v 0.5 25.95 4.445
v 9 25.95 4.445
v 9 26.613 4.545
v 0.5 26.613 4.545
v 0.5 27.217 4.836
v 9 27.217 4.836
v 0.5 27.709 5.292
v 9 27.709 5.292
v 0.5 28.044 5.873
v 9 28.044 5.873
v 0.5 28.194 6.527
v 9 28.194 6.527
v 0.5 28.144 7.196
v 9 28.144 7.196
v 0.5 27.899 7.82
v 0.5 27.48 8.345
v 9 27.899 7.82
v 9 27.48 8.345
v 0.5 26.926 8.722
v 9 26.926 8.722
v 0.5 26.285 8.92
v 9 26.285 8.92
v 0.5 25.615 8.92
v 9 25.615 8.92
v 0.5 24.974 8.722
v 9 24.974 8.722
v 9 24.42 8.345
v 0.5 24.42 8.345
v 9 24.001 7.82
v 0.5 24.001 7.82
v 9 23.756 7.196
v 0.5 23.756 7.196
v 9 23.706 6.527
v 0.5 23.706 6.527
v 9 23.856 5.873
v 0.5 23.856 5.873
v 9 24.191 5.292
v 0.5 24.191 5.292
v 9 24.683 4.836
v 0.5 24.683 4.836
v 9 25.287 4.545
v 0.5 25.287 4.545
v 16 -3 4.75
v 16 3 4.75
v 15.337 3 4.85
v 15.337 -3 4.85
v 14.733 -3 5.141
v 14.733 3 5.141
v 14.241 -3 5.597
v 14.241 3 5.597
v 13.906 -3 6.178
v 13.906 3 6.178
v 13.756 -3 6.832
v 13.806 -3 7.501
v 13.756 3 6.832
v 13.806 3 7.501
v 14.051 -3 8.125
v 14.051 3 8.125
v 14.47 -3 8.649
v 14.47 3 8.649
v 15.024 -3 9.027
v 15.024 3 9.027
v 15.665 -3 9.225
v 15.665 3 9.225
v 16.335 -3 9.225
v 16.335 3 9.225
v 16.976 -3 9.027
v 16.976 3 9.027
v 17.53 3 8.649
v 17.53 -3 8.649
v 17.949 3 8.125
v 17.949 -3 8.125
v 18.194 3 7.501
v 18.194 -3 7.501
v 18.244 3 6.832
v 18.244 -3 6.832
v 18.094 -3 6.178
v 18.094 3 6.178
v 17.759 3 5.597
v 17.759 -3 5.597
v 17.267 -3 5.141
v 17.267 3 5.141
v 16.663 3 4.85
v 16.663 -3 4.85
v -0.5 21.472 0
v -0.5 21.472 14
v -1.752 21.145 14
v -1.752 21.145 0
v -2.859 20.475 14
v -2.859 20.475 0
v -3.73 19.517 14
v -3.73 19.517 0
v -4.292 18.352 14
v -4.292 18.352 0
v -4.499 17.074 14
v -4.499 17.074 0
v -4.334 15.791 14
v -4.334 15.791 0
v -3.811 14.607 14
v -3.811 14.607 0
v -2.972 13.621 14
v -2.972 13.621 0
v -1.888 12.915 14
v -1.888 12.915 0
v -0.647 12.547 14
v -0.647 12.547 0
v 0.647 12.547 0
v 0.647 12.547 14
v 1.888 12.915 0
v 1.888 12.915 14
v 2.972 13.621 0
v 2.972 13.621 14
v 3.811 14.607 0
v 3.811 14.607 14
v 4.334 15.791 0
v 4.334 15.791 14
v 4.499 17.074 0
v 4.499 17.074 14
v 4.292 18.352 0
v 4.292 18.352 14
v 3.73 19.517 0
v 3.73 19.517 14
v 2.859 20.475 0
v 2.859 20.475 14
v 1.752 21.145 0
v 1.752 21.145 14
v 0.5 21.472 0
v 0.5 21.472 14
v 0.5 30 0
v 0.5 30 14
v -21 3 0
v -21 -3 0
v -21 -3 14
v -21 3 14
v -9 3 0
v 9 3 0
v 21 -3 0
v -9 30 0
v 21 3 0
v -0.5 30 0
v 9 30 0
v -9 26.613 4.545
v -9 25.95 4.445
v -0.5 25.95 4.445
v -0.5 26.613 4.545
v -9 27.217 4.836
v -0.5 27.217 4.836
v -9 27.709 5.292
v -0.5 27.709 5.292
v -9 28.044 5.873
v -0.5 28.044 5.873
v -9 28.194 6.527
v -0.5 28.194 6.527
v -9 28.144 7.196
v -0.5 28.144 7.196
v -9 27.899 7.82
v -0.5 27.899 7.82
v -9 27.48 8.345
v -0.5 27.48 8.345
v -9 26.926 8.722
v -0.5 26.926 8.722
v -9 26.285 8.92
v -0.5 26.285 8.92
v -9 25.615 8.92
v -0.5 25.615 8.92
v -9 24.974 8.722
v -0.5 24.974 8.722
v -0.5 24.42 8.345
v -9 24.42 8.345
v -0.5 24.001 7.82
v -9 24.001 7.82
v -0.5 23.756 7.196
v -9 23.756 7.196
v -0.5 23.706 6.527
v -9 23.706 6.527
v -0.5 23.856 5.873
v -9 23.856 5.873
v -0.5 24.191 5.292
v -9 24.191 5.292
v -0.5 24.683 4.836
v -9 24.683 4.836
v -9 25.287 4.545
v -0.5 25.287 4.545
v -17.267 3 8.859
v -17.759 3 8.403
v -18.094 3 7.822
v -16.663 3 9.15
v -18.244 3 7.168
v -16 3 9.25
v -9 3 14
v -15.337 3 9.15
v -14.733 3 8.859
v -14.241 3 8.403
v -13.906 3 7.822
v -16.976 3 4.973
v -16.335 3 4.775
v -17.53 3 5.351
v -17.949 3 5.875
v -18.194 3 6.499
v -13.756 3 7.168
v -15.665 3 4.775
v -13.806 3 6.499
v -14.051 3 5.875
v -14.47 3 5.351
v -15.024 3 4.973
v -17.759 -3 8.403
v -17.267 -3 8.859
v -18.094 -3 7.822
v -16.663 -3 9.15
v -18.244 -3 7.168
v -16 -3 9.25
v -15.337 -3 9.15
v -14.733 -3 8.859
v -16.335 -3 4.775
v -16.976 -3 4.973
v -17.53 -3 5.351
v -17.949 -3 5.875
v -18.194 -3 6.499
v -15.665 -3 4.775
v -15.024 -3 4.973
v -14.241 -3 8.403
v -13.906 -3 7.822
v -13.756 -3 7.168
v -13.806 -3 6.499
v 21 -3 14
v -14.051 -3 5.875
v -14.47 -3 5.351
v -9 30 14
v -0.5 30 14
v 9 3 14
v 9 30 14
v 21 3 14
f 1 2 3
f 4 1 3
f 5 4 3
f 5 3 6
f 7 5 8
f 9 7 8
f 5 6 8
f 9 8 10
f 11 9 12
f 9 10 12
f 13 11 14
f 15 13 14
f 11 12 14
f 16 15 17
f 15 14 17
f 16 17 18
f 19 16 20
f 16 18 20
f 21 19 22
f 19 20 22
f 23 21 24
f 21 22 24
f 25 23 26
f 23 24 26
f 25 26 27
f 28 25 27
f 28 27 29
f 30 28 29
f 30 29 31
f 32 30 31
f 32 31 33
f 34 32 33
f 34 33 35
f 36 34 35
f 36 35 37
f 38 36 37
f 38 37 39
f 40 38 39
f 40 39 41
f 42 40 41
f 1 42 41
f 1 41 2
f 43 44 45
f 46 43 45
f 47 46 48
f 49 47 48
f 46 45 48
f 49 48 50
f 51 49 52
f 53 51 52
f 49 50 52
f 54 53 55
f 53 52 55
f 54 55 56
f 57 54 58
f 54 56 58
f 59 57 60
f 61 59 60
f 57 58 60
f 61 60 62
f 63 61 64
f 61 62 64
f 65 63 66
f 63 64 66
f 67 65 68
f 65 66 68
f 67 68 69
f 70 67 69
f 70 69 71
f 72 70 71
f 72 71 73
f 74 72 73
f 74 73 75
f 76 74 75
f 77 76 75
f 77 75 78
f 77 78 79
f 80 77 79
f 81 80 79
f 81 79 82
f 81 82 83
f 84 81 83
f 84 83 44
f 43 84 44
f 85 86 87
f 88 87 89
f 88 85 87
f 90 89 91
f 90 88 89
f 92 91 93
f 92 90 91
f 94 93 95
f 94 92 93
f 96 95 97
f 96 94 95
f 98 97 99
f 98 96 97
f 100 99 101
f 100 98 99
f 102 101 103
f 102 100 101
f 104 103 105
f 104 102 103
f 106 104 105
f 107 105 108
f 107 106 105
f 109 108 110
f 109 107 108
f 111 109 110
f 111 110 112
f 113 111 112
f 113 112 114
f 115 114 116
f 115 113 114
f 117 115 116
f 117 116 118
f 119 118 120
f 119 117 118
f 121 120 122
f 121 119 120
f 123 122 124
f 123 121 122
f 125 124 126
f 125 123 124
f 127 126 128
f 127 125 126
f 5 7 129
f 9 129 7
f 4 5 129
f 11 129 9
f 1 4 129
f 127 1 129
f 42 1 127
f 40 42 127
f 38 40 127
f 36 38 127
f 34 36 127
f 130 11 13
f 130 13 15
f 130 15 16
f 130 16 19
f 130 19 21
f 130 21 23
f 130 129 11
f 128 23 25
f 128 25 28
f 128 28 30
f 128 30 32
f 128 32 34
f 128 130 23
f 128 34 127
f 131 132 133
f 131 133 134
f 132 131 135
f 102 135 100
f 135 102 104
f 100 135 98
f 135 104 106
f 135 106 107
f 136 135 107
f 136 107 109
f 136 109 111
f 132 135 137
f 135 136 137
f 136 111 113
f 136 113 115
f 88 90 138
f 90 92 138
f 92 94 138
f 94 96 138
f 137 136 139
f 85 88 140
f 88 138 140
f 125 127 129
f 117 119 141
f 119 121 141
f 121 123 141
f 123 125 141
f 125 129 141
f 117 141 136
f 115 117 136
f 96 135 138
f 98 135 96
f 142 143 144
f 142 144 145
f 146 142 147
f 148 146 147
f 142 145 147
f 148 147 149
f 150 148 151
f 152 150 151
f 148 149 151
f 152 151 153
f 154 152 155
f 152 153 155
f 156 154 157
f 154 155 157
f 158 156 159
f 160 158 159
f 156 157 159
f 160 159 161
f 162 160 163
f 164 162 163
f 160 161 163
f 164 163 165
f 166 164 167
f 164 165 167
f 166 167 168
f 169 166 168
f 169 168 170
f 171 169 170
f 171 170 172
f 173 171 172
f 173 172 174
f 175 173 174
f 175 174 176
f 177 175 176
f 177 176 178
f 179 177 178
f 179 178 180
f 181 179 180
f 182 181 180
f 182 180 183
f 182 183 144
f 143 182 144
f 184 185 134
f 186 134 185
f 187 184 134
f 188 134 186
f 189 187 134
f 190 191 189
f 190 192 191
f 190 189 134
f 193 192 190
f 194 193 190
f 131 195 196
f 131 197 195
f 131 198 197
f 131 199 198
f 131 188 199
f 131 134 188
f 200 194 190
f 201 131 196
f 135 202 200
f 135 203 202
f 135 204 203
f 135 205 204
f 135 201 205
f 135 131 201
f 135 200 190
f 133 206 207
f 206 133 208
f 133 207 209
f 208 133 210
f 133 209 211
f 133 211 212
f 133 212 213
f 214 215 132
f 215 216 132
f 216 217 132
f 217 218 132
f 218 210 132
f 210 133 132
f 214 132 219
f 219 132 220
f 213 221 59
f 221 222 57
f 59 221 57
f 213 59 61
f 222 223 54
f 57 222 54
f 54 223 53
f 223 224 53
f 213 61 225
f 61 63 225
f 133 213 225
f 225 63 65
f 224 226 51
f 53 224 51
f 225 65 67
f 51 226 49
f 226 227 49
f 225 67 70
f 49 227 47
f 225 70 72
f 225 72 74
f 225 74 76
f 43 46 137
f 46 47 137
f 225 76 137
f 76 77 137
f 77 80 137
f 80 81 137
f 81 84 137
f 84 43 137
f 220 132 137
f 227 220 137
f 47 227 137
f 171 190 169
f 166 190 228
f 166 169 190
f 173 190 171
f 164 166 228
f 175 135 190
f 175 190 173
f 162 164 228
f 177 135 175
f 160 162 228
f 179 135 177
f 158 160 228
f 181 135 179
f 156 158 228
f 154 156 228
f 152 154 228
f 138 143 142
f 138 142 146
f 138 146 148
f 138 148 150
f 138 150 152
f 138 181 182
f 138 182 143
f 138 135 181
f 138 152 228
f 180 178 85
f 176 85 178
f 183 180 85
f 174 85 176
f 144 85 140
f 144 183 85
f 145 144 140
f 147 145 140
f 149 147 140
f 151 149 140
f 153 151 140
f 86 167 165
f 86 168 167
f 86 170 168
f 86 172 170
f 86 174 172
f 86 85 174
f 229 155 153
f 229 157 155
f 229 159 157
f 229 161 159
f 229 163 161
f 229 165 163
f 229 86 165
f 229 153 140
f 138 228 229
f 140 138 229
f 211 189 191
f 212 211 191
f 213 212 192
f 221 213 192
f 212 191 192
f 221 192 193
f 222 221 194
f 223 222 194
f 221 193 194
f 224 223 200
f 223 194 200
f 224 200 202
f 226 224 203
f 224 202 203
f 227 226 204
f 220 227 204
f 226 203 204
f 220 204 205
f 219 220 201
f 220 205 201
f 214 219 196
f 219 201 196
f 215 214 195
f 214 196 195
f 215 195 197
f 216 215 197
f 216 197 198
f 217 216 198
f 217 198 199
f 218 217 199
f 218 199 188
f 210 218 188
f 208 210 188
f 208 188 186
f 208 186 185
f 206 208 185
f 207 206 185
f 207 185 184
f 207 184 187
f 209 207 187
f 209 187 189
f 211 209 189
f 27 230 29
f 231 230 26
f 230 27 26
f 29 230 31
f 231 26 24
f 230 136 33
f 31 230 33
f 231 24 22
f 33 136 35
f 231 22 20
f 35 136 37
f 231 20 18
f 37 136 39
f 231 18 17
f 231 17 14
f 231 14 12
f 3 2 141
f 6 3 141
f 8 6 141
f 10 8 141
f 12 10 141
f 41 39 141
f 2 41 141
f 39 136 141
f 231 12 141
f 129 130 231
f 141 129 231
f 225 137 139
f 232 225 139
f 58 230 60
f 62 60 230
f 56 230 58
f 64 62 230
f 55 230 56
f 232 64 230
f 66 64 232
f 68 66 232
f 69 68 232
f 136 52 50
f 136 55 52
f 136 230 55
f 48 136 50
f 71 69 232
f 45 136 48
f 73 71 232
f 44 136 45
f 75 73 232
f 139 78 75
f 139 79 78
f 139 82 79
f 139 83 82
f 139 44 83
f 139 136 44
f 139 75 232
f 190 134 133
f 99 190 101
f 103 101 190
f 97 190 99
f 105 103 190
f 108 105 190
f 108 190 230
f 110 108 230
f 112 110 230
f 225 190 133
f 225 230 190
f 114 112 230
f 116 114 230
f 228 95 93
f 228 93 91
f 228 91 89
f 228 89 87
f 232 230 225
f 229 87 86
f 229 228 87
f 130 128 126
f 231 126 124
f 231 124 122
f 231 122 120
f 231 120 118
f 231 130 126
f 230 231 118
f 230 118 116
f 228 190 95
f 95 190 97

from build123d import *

# Parameters (mm, degrees)
SKETCH1_W           = 18
SKETCH1_H           = 27
SKETCH1_R           = 4.5
SKETCH1_W_2         = 42
SKETCH1_H_2         = 6
BOSS_EXTRUDE1_DEPTH = 14
SKETCH2_R           = 2.25
CUT_EXTRUDE1_DEPTH  = 37.959437225
CUT_EXTRUDE2_DEPTH  = 40.204591568
CUT_EXTRUDE3_REACH  = 46.677
SKETCH4_R           = 2.25


with BuildPart() as part:
    # Sketch1 → Boss-Extrude1 (new body)
    # profile 1 of 2: a face of its own
    with BuildSketch(Plane.XY):
        with Locations((0, 16.5)):
            Rectangle(SKETCH1_W, SKETCH1_H)
        with Locations((0, 17)):
            Circle(SKETCH1_R, mode=Mode.SUBTRACT)
    # profile 2 of 2: a face of its own
    with BuildSketch(Plane.XY):
        Rectangle(SKETCH1_W_2, SKETCH1_H_2)
    extrude(amount=BOSS_EXTRUDE1_DEPTH)

    # Sketch2 → Cut-Extrude1 (cut, through all)
    with BuildSketch(Plane(origin=(0, 3, 0), x_dir=(1, 0, 0), z_dir=(0, 1, 0))):
        with Locations(Location((-16, -7, 0), (0, 0, 270))):
            Circle(SKETCH2_R)
        with Locations(Location((16, -7, 0), (0, 0, 90))):
            Circle(SKETCH2_R)
    extrude(amount=-CUT_EXTRUDE1_DEPTH, mode=Mode.SUBTRACT)

    # Sketch3 → Cut-Extrude2 (cut, through all)
    with BuildSketch(Plane.XY.offset(14)):
        with BuildLine():
            Line((0.5, 30), (0.5, 21.472135955))
            ThreePointArc((0.5, 21.472135955), (0, 21.5), (-0.5, 21.472135955))
            Line((-0.5, 21.472135955), (-0.5, 30))
            Line((-0.5, 30), (0.5, 30))
        make_face()
    extrude(amount=-CUT_EXTRUDE2_DEPTH, mode=Mode.SUBTRACT)

    # Cut-Extrude3: up to this face of the body (flat: up to its plane)
    cut_extrude3_end = Plane(part.part.faces().sort_by_distance((-9, 16.5, 7))[0])
    # Sketch4 → Cut-Extrude3 (cut, up to the picked face)
    with BuildSketch(Plane(origin=(9, 0, 0), x_dir=(0, 0, -1), z_dir=(1, 0, 0)), mode=Mode.PRIVATE) as cut_extrude3_sk1:
        with Locations((-6.695292014, 25.95)):
            Circle(SKETCH4_R)
    cut_extrude3_tool1 = split(extrude(cut_extrude3_sk1.sketch, amount=-CUT_EXTRUDE3_REACH, mode=Mode.PRIVATE), bisect_by=cut_extrude3_end, keep=Keep.BOTH, mode=Mode.PRIVATE)
    add(cut_extrude3_tool1.solids().sort_by(Axis((9, 25.95, 6.695292), (-1, 0, 0)))[0], mode=Mode.SUBTRACT)


solid = part.part
